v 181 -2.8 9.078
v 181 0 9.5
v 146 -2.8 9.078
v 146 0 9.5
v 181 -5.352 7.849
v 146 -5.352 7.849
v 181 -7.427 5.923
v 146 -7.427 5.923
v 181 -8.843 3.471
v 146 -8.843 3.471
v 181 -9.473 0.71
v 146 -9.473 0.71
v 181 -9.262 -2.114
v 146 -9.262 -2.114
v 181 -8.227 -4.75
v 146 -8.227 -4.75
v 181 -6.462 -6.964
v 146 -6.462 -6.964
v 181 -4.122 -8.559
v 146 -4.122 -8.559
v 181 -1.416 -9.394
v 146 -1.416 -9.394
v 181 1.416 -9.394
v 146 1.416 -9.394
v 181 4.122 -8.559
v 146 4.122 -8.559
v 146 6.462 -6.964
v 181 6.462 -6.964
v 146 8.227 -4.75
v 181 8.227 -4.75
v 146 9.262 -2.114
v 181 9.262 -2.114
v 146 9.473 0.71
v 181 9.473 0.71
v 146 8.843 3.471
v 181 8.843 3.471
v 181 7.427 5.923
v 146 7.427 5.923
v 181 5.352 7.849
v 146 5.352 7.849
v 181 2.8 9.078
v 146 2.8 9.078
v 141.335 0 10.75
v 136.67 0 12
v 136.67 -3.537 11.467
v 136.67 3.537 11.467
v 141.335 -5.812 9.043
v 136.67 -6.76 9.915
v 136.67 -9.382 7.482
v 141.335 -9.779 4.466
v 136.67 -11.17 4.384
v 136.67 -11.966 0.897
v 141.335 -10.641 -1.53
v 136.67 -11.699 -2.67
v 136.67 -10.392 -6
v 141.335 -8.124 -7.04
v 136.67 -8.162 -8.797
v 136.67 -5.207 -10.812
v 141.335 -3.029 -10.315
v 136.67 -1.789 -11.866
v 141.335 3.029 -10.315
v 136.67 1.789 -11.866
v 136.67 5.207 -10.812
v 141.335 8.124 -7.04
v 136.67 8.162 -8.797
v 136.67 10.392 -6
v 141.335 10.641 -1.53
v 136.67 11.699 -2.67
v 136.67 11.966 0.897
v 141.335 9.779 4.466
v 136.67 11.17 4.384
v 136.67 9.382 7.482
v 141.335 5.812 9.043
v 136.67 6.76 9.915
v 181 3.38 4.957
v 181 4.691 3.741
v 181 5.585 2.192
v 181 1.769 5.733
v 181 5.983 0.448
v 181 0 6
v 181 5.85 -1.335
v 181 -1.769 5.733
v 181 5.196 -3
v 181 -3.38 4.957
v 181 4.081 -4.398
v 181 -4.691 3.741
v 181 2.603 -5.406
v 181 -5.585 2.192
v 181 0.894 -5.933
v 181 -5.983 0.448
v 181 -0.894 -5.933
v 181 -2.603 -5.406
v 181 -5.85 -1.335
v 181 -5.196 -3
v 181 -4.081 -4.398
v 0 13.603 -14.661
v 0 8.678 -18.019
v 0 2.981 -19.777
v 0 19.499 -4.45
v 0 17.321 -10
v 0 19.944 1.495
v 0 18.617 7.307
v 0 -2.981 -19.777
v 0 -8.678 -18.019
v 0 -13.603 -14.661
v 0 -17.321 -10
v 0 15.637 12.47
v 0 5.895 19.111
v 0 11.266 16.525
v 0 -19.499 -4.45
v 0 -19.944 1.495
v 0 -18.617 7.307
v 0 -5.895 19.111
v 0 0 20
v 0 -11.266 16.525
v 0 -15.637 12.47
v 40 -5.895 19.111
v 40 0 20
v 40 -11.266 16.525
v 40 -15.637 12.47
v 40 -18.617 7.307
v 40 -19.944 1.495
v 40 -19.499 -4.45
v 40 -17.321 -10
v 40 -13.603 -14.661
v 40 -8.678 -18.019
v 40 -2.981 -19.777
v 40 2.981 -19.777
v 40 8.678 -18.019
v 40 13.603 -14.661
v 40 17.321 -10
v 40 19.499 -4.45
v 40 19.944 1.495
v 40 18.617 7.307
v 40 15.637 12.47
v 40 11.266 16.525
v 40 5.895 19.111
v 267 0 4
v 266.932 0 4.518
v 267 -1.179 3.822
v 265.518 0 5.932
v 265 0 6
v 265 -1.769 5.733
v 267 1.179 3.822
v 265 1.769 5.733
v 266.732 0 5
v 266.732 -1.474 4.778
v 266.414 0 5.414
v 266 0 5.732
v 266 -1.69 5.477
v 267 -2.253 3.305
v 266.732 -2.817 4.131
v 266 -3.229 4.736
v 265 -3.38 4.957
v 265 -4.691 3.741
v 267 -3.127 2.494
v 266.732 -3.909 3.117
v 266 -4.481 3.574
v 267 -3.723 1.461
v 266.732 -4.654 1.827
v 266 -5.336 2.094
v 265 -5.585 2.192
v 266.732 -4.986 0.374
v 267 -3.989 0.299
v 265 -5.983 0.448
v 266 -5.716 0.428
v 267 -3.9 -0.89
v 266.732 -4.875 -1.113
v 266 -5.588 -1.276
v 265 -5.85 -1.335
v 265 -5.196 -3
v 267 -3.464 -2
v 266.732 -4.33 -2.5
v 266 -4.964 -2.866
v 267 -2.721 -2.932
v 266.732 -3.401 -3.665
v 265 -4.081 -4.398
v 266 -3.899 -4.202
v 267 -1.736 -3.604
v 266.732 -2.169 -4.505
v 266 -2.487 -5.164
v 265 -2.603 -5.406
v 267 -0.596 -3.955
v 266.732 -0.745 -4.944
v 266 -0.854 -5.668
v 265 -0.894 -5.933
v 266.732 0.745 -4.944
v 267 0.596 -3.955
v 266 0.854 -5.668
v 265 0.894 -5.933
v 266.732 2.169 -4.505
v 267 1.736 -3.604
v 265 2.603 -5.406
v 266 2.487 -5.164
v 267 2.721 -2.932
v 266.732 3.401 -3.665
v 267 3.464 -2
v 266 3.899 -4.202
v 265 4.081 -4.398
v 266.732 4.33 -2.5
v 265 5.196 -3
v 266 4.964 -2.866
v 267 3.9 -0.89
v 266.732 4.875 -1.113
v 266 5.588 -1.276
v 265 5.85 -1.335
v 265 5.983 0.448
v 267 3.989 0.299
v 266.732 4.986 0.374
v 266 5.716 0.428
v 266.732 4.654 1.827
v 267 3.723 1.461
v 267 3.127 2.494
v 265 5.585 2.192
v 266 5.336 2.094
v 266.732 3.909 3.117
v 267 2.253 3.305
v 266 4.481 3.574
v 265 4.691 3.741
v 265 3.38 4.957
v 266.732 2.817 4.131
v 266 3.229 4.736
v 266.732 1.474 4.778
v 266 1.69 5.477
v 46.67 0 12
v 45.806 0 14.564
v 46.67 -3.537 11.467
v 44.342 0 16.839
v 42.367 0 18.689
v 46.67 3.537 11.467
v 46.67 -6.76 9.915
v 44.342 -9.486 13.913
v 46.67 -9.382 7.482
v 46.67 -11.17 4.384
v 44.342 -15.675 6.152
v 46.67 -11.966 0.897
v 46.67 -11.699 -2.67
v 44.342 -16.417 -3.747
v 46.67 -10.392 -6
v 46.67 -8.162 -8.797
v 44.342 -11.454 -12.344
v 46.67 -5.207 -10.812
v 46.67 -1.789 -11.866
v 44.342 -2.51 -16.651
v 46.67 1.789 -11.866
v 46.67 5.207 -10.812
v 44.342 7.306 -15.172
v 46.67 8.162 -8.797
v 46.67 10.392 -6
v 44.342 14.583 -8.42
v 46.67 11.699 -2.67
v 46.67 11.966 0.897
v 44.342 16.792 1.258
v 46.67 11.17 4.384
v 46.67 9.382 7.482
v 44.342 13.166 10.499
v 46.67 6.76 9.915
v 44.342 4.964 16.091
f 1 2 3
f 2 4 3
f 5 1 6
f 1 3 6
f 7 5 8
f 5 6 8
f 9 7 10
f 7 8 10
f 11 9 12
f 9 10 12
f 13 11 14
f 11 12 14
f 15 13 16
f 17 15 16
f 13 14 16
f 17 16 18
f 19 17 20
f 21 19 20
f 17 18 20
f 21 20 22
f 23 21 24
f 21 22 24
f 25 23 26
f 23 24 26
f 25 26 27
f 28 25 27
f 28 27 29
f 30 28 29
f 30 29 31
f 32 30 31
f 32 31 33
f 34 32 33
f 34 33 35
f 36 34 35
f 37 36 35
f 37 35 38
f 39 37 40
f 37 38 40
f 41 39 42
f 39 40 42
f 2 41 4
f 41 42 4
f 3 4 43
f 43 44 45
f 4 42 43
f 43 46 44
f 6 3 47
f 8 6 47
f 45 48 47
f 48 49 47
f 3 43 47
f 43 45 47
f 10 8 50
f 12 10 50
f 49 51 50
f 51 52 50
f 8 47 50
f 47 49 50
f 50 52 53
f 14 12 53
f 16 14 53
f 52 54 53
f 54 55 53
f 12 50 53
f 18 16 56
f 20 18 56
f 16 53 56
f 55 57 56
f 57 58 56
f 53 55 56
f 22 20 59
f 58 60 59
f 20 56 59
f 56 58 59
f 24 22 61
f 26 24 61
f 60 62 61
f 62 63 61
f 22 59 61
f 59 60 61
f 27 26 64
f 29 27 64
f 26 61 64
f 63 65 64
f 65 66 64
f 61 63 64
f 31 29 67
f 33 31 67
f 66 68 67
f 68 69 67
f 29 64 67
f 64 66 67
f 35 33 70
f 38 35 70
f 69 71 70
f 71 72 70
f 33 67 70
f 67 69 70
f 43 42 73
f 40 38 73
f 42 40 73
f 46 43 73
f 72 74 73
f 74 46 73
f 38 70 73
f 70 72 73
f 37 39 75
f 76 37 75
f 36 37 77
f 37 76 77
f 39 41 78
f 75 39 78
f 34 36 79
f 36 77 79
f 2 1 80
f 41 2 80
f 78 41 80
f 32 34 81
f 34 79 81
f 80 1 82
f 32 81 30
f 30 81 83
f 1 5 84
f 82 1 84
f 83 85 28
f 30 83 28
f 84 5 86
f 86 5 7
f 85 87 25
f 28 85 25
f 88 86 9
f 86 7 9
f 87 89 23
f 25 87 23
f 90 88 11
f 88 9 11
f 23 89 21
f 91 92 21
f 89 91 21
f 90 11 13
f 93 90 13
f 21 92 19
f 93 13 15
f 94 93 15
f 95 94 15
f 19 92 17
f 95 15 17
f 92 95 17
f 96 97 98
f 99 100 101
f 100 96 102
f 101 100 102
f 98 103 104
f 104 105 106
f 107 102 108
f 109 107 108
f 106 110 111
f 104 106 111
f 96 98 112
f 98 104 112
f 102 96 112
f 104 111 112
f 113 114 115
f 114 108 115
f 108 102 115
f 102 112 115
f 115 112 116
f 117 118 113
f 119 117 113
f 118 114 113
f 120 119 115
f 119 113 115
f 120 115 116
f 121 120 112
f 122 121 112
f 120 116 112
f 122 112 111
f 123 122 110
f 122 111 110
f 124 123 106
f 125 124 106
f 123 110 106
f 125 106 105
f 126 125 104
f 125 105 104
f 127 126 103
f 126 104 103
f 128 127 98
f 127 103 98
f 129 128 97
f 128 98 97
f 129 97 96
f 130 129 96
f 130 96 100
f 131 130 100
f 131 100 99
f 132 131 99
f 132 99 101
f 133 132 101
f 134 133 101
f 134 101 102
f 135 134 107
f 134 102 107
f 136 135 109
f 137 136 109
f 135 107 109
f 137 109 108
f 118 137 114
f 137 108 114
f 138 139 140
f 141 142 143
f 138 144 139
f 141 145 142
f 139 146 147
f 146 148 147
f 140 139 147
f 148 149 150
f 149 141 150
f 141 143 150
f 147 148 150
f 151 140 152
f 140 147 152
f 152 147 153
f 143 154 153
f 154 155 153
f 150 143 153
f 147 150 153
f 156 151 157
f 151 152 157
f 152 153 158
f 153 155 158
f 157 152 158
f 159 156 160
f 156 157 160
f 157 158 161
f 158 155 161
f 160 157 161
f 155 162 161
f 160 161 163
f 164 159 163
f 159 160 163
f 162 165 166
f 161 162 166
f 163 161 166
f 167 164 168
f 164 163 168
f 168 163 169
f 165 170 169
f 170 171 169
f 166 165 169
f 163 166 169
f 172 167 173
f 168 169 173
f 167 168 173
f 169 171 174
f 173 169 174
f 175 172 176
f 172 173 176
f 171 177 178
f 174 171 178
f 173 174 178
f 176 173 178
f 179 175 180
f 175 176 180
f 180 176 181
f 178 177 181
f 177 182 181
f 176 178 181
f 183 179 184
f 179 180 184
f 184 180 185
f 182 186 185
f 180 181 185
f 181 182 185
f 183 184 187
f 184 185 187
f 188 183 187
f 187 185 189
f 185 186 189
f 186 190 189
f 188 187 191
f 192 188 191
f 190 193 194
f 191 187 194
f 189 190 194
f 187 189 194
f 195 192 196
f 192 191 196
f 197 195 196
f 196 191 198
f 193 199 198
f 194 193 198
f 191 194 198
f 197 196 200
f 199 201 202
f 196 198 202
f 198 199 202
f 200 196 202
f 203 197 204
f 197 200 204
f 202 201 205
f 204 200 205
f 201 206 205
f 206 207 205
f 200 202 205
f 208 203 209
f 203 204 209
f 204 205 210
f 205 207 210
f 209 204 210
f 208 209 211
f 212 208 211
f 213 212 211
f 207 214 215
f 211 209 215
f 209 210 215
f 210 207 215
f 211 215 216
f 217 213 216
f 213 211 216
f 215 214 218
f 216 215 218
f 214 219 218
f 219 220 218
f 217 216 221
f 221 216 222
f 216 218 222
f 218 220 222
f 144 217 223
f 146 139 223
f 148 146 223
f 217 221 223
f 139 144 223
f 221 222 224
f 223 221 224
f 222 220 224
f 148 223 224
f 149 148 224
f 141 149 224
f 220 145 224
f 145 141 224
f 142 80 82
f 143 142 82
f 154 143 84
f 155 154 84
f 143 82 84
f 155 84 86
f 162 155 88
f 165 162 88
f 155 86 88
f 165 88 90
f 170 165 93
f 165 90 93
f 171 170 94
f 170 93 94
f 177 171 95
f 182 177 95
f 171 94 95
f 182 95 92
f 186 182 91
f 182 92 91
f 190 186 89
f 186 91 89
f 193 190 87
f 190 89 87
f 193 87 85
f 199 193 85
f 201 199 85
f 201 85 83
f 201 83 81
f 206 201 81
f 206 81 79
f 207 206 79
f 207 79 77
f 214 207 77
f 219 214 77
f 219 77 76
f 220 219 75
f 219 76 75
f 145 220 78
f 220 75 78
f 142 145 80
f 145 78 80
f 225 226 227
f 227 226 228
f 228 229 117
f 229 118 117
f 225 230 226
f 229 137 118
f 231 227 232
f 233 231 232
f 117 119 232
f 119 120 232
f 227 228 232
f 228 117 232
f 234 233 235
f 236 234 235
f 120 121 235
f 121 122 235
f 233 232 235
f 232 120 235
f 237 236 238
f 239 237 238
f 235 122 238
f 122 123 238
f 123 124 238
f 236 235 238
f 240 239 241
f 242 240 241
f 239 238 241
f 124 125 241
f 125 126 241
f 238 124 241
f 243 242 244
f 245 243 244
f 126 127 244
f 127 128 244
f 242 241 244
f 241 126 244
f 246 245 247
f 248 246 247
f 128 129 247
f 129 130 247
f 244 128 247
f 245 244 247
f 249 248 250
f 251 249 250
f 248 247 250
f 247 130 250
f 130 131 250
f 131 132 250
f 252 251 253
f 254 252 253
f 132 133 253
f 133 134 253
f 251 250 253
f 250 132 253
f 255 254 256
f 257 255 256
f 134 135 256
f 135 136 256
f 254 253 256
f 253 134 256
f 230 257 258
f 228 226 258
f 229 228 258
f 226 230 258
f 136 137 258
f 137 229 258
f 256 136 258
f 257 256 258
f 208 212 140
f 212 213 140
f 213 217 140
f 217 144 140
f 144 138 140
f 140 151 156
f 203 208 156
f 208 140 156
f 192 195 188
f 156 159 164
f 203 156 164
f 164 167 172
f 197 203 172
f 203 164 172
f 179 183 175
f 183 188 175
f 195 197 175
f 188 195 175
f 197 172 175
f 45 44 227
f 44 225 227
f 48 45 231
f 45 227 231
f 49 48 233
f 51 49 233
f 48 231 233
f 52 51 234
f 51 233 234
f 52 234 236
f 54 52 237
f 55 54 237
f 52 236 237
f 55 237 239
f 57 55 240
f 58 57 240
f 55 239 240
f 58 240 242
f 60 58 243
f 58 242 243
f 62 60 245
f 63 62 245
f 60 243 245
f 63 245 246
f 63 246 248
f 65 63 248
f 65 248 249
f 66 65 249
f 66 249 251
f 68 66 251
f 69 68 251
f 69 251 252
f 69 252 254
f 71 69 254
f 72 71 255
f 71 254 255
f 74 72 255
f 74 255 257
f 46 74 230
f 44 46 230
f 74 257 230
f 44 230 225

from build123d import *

# Parameters (mm, degrees)
F2_R = 2


with BuildPart() as f1:
    # F0 (on Front) → F1 (revolve)
    with BuildSketch(Plane.XZ):
        with BuildLine():
            Line((0, 0), (267, 0))
            Line((267, 0), (267, 6))
            Line((267, 6), (181, 6))
            Line((181, 6), (181, 9.5))
            Line((181, 9.5), (146, 9.5))
            Line((146, 9.5), (136.669873, 12))
            Line((136.669873, 12), (46.669873, 12))
            ThreePointArc((46.669873, 12), (44.341818, 16.839471), (40, 20))
            Line((40, 20), (0, 20))
            Line((0, 20), (0, 0))
        make_face()
    revolve(axis=Axis((133.5, 0, 0), (1, 0, 0)))

    # F2
    f2_edges = [f1.edges().sort_by_distance(p)[0] for p in [
        (267, 0, -6),
    ]]
    fillet(f2_edges, radius=F2_R)


solid = f1.part
